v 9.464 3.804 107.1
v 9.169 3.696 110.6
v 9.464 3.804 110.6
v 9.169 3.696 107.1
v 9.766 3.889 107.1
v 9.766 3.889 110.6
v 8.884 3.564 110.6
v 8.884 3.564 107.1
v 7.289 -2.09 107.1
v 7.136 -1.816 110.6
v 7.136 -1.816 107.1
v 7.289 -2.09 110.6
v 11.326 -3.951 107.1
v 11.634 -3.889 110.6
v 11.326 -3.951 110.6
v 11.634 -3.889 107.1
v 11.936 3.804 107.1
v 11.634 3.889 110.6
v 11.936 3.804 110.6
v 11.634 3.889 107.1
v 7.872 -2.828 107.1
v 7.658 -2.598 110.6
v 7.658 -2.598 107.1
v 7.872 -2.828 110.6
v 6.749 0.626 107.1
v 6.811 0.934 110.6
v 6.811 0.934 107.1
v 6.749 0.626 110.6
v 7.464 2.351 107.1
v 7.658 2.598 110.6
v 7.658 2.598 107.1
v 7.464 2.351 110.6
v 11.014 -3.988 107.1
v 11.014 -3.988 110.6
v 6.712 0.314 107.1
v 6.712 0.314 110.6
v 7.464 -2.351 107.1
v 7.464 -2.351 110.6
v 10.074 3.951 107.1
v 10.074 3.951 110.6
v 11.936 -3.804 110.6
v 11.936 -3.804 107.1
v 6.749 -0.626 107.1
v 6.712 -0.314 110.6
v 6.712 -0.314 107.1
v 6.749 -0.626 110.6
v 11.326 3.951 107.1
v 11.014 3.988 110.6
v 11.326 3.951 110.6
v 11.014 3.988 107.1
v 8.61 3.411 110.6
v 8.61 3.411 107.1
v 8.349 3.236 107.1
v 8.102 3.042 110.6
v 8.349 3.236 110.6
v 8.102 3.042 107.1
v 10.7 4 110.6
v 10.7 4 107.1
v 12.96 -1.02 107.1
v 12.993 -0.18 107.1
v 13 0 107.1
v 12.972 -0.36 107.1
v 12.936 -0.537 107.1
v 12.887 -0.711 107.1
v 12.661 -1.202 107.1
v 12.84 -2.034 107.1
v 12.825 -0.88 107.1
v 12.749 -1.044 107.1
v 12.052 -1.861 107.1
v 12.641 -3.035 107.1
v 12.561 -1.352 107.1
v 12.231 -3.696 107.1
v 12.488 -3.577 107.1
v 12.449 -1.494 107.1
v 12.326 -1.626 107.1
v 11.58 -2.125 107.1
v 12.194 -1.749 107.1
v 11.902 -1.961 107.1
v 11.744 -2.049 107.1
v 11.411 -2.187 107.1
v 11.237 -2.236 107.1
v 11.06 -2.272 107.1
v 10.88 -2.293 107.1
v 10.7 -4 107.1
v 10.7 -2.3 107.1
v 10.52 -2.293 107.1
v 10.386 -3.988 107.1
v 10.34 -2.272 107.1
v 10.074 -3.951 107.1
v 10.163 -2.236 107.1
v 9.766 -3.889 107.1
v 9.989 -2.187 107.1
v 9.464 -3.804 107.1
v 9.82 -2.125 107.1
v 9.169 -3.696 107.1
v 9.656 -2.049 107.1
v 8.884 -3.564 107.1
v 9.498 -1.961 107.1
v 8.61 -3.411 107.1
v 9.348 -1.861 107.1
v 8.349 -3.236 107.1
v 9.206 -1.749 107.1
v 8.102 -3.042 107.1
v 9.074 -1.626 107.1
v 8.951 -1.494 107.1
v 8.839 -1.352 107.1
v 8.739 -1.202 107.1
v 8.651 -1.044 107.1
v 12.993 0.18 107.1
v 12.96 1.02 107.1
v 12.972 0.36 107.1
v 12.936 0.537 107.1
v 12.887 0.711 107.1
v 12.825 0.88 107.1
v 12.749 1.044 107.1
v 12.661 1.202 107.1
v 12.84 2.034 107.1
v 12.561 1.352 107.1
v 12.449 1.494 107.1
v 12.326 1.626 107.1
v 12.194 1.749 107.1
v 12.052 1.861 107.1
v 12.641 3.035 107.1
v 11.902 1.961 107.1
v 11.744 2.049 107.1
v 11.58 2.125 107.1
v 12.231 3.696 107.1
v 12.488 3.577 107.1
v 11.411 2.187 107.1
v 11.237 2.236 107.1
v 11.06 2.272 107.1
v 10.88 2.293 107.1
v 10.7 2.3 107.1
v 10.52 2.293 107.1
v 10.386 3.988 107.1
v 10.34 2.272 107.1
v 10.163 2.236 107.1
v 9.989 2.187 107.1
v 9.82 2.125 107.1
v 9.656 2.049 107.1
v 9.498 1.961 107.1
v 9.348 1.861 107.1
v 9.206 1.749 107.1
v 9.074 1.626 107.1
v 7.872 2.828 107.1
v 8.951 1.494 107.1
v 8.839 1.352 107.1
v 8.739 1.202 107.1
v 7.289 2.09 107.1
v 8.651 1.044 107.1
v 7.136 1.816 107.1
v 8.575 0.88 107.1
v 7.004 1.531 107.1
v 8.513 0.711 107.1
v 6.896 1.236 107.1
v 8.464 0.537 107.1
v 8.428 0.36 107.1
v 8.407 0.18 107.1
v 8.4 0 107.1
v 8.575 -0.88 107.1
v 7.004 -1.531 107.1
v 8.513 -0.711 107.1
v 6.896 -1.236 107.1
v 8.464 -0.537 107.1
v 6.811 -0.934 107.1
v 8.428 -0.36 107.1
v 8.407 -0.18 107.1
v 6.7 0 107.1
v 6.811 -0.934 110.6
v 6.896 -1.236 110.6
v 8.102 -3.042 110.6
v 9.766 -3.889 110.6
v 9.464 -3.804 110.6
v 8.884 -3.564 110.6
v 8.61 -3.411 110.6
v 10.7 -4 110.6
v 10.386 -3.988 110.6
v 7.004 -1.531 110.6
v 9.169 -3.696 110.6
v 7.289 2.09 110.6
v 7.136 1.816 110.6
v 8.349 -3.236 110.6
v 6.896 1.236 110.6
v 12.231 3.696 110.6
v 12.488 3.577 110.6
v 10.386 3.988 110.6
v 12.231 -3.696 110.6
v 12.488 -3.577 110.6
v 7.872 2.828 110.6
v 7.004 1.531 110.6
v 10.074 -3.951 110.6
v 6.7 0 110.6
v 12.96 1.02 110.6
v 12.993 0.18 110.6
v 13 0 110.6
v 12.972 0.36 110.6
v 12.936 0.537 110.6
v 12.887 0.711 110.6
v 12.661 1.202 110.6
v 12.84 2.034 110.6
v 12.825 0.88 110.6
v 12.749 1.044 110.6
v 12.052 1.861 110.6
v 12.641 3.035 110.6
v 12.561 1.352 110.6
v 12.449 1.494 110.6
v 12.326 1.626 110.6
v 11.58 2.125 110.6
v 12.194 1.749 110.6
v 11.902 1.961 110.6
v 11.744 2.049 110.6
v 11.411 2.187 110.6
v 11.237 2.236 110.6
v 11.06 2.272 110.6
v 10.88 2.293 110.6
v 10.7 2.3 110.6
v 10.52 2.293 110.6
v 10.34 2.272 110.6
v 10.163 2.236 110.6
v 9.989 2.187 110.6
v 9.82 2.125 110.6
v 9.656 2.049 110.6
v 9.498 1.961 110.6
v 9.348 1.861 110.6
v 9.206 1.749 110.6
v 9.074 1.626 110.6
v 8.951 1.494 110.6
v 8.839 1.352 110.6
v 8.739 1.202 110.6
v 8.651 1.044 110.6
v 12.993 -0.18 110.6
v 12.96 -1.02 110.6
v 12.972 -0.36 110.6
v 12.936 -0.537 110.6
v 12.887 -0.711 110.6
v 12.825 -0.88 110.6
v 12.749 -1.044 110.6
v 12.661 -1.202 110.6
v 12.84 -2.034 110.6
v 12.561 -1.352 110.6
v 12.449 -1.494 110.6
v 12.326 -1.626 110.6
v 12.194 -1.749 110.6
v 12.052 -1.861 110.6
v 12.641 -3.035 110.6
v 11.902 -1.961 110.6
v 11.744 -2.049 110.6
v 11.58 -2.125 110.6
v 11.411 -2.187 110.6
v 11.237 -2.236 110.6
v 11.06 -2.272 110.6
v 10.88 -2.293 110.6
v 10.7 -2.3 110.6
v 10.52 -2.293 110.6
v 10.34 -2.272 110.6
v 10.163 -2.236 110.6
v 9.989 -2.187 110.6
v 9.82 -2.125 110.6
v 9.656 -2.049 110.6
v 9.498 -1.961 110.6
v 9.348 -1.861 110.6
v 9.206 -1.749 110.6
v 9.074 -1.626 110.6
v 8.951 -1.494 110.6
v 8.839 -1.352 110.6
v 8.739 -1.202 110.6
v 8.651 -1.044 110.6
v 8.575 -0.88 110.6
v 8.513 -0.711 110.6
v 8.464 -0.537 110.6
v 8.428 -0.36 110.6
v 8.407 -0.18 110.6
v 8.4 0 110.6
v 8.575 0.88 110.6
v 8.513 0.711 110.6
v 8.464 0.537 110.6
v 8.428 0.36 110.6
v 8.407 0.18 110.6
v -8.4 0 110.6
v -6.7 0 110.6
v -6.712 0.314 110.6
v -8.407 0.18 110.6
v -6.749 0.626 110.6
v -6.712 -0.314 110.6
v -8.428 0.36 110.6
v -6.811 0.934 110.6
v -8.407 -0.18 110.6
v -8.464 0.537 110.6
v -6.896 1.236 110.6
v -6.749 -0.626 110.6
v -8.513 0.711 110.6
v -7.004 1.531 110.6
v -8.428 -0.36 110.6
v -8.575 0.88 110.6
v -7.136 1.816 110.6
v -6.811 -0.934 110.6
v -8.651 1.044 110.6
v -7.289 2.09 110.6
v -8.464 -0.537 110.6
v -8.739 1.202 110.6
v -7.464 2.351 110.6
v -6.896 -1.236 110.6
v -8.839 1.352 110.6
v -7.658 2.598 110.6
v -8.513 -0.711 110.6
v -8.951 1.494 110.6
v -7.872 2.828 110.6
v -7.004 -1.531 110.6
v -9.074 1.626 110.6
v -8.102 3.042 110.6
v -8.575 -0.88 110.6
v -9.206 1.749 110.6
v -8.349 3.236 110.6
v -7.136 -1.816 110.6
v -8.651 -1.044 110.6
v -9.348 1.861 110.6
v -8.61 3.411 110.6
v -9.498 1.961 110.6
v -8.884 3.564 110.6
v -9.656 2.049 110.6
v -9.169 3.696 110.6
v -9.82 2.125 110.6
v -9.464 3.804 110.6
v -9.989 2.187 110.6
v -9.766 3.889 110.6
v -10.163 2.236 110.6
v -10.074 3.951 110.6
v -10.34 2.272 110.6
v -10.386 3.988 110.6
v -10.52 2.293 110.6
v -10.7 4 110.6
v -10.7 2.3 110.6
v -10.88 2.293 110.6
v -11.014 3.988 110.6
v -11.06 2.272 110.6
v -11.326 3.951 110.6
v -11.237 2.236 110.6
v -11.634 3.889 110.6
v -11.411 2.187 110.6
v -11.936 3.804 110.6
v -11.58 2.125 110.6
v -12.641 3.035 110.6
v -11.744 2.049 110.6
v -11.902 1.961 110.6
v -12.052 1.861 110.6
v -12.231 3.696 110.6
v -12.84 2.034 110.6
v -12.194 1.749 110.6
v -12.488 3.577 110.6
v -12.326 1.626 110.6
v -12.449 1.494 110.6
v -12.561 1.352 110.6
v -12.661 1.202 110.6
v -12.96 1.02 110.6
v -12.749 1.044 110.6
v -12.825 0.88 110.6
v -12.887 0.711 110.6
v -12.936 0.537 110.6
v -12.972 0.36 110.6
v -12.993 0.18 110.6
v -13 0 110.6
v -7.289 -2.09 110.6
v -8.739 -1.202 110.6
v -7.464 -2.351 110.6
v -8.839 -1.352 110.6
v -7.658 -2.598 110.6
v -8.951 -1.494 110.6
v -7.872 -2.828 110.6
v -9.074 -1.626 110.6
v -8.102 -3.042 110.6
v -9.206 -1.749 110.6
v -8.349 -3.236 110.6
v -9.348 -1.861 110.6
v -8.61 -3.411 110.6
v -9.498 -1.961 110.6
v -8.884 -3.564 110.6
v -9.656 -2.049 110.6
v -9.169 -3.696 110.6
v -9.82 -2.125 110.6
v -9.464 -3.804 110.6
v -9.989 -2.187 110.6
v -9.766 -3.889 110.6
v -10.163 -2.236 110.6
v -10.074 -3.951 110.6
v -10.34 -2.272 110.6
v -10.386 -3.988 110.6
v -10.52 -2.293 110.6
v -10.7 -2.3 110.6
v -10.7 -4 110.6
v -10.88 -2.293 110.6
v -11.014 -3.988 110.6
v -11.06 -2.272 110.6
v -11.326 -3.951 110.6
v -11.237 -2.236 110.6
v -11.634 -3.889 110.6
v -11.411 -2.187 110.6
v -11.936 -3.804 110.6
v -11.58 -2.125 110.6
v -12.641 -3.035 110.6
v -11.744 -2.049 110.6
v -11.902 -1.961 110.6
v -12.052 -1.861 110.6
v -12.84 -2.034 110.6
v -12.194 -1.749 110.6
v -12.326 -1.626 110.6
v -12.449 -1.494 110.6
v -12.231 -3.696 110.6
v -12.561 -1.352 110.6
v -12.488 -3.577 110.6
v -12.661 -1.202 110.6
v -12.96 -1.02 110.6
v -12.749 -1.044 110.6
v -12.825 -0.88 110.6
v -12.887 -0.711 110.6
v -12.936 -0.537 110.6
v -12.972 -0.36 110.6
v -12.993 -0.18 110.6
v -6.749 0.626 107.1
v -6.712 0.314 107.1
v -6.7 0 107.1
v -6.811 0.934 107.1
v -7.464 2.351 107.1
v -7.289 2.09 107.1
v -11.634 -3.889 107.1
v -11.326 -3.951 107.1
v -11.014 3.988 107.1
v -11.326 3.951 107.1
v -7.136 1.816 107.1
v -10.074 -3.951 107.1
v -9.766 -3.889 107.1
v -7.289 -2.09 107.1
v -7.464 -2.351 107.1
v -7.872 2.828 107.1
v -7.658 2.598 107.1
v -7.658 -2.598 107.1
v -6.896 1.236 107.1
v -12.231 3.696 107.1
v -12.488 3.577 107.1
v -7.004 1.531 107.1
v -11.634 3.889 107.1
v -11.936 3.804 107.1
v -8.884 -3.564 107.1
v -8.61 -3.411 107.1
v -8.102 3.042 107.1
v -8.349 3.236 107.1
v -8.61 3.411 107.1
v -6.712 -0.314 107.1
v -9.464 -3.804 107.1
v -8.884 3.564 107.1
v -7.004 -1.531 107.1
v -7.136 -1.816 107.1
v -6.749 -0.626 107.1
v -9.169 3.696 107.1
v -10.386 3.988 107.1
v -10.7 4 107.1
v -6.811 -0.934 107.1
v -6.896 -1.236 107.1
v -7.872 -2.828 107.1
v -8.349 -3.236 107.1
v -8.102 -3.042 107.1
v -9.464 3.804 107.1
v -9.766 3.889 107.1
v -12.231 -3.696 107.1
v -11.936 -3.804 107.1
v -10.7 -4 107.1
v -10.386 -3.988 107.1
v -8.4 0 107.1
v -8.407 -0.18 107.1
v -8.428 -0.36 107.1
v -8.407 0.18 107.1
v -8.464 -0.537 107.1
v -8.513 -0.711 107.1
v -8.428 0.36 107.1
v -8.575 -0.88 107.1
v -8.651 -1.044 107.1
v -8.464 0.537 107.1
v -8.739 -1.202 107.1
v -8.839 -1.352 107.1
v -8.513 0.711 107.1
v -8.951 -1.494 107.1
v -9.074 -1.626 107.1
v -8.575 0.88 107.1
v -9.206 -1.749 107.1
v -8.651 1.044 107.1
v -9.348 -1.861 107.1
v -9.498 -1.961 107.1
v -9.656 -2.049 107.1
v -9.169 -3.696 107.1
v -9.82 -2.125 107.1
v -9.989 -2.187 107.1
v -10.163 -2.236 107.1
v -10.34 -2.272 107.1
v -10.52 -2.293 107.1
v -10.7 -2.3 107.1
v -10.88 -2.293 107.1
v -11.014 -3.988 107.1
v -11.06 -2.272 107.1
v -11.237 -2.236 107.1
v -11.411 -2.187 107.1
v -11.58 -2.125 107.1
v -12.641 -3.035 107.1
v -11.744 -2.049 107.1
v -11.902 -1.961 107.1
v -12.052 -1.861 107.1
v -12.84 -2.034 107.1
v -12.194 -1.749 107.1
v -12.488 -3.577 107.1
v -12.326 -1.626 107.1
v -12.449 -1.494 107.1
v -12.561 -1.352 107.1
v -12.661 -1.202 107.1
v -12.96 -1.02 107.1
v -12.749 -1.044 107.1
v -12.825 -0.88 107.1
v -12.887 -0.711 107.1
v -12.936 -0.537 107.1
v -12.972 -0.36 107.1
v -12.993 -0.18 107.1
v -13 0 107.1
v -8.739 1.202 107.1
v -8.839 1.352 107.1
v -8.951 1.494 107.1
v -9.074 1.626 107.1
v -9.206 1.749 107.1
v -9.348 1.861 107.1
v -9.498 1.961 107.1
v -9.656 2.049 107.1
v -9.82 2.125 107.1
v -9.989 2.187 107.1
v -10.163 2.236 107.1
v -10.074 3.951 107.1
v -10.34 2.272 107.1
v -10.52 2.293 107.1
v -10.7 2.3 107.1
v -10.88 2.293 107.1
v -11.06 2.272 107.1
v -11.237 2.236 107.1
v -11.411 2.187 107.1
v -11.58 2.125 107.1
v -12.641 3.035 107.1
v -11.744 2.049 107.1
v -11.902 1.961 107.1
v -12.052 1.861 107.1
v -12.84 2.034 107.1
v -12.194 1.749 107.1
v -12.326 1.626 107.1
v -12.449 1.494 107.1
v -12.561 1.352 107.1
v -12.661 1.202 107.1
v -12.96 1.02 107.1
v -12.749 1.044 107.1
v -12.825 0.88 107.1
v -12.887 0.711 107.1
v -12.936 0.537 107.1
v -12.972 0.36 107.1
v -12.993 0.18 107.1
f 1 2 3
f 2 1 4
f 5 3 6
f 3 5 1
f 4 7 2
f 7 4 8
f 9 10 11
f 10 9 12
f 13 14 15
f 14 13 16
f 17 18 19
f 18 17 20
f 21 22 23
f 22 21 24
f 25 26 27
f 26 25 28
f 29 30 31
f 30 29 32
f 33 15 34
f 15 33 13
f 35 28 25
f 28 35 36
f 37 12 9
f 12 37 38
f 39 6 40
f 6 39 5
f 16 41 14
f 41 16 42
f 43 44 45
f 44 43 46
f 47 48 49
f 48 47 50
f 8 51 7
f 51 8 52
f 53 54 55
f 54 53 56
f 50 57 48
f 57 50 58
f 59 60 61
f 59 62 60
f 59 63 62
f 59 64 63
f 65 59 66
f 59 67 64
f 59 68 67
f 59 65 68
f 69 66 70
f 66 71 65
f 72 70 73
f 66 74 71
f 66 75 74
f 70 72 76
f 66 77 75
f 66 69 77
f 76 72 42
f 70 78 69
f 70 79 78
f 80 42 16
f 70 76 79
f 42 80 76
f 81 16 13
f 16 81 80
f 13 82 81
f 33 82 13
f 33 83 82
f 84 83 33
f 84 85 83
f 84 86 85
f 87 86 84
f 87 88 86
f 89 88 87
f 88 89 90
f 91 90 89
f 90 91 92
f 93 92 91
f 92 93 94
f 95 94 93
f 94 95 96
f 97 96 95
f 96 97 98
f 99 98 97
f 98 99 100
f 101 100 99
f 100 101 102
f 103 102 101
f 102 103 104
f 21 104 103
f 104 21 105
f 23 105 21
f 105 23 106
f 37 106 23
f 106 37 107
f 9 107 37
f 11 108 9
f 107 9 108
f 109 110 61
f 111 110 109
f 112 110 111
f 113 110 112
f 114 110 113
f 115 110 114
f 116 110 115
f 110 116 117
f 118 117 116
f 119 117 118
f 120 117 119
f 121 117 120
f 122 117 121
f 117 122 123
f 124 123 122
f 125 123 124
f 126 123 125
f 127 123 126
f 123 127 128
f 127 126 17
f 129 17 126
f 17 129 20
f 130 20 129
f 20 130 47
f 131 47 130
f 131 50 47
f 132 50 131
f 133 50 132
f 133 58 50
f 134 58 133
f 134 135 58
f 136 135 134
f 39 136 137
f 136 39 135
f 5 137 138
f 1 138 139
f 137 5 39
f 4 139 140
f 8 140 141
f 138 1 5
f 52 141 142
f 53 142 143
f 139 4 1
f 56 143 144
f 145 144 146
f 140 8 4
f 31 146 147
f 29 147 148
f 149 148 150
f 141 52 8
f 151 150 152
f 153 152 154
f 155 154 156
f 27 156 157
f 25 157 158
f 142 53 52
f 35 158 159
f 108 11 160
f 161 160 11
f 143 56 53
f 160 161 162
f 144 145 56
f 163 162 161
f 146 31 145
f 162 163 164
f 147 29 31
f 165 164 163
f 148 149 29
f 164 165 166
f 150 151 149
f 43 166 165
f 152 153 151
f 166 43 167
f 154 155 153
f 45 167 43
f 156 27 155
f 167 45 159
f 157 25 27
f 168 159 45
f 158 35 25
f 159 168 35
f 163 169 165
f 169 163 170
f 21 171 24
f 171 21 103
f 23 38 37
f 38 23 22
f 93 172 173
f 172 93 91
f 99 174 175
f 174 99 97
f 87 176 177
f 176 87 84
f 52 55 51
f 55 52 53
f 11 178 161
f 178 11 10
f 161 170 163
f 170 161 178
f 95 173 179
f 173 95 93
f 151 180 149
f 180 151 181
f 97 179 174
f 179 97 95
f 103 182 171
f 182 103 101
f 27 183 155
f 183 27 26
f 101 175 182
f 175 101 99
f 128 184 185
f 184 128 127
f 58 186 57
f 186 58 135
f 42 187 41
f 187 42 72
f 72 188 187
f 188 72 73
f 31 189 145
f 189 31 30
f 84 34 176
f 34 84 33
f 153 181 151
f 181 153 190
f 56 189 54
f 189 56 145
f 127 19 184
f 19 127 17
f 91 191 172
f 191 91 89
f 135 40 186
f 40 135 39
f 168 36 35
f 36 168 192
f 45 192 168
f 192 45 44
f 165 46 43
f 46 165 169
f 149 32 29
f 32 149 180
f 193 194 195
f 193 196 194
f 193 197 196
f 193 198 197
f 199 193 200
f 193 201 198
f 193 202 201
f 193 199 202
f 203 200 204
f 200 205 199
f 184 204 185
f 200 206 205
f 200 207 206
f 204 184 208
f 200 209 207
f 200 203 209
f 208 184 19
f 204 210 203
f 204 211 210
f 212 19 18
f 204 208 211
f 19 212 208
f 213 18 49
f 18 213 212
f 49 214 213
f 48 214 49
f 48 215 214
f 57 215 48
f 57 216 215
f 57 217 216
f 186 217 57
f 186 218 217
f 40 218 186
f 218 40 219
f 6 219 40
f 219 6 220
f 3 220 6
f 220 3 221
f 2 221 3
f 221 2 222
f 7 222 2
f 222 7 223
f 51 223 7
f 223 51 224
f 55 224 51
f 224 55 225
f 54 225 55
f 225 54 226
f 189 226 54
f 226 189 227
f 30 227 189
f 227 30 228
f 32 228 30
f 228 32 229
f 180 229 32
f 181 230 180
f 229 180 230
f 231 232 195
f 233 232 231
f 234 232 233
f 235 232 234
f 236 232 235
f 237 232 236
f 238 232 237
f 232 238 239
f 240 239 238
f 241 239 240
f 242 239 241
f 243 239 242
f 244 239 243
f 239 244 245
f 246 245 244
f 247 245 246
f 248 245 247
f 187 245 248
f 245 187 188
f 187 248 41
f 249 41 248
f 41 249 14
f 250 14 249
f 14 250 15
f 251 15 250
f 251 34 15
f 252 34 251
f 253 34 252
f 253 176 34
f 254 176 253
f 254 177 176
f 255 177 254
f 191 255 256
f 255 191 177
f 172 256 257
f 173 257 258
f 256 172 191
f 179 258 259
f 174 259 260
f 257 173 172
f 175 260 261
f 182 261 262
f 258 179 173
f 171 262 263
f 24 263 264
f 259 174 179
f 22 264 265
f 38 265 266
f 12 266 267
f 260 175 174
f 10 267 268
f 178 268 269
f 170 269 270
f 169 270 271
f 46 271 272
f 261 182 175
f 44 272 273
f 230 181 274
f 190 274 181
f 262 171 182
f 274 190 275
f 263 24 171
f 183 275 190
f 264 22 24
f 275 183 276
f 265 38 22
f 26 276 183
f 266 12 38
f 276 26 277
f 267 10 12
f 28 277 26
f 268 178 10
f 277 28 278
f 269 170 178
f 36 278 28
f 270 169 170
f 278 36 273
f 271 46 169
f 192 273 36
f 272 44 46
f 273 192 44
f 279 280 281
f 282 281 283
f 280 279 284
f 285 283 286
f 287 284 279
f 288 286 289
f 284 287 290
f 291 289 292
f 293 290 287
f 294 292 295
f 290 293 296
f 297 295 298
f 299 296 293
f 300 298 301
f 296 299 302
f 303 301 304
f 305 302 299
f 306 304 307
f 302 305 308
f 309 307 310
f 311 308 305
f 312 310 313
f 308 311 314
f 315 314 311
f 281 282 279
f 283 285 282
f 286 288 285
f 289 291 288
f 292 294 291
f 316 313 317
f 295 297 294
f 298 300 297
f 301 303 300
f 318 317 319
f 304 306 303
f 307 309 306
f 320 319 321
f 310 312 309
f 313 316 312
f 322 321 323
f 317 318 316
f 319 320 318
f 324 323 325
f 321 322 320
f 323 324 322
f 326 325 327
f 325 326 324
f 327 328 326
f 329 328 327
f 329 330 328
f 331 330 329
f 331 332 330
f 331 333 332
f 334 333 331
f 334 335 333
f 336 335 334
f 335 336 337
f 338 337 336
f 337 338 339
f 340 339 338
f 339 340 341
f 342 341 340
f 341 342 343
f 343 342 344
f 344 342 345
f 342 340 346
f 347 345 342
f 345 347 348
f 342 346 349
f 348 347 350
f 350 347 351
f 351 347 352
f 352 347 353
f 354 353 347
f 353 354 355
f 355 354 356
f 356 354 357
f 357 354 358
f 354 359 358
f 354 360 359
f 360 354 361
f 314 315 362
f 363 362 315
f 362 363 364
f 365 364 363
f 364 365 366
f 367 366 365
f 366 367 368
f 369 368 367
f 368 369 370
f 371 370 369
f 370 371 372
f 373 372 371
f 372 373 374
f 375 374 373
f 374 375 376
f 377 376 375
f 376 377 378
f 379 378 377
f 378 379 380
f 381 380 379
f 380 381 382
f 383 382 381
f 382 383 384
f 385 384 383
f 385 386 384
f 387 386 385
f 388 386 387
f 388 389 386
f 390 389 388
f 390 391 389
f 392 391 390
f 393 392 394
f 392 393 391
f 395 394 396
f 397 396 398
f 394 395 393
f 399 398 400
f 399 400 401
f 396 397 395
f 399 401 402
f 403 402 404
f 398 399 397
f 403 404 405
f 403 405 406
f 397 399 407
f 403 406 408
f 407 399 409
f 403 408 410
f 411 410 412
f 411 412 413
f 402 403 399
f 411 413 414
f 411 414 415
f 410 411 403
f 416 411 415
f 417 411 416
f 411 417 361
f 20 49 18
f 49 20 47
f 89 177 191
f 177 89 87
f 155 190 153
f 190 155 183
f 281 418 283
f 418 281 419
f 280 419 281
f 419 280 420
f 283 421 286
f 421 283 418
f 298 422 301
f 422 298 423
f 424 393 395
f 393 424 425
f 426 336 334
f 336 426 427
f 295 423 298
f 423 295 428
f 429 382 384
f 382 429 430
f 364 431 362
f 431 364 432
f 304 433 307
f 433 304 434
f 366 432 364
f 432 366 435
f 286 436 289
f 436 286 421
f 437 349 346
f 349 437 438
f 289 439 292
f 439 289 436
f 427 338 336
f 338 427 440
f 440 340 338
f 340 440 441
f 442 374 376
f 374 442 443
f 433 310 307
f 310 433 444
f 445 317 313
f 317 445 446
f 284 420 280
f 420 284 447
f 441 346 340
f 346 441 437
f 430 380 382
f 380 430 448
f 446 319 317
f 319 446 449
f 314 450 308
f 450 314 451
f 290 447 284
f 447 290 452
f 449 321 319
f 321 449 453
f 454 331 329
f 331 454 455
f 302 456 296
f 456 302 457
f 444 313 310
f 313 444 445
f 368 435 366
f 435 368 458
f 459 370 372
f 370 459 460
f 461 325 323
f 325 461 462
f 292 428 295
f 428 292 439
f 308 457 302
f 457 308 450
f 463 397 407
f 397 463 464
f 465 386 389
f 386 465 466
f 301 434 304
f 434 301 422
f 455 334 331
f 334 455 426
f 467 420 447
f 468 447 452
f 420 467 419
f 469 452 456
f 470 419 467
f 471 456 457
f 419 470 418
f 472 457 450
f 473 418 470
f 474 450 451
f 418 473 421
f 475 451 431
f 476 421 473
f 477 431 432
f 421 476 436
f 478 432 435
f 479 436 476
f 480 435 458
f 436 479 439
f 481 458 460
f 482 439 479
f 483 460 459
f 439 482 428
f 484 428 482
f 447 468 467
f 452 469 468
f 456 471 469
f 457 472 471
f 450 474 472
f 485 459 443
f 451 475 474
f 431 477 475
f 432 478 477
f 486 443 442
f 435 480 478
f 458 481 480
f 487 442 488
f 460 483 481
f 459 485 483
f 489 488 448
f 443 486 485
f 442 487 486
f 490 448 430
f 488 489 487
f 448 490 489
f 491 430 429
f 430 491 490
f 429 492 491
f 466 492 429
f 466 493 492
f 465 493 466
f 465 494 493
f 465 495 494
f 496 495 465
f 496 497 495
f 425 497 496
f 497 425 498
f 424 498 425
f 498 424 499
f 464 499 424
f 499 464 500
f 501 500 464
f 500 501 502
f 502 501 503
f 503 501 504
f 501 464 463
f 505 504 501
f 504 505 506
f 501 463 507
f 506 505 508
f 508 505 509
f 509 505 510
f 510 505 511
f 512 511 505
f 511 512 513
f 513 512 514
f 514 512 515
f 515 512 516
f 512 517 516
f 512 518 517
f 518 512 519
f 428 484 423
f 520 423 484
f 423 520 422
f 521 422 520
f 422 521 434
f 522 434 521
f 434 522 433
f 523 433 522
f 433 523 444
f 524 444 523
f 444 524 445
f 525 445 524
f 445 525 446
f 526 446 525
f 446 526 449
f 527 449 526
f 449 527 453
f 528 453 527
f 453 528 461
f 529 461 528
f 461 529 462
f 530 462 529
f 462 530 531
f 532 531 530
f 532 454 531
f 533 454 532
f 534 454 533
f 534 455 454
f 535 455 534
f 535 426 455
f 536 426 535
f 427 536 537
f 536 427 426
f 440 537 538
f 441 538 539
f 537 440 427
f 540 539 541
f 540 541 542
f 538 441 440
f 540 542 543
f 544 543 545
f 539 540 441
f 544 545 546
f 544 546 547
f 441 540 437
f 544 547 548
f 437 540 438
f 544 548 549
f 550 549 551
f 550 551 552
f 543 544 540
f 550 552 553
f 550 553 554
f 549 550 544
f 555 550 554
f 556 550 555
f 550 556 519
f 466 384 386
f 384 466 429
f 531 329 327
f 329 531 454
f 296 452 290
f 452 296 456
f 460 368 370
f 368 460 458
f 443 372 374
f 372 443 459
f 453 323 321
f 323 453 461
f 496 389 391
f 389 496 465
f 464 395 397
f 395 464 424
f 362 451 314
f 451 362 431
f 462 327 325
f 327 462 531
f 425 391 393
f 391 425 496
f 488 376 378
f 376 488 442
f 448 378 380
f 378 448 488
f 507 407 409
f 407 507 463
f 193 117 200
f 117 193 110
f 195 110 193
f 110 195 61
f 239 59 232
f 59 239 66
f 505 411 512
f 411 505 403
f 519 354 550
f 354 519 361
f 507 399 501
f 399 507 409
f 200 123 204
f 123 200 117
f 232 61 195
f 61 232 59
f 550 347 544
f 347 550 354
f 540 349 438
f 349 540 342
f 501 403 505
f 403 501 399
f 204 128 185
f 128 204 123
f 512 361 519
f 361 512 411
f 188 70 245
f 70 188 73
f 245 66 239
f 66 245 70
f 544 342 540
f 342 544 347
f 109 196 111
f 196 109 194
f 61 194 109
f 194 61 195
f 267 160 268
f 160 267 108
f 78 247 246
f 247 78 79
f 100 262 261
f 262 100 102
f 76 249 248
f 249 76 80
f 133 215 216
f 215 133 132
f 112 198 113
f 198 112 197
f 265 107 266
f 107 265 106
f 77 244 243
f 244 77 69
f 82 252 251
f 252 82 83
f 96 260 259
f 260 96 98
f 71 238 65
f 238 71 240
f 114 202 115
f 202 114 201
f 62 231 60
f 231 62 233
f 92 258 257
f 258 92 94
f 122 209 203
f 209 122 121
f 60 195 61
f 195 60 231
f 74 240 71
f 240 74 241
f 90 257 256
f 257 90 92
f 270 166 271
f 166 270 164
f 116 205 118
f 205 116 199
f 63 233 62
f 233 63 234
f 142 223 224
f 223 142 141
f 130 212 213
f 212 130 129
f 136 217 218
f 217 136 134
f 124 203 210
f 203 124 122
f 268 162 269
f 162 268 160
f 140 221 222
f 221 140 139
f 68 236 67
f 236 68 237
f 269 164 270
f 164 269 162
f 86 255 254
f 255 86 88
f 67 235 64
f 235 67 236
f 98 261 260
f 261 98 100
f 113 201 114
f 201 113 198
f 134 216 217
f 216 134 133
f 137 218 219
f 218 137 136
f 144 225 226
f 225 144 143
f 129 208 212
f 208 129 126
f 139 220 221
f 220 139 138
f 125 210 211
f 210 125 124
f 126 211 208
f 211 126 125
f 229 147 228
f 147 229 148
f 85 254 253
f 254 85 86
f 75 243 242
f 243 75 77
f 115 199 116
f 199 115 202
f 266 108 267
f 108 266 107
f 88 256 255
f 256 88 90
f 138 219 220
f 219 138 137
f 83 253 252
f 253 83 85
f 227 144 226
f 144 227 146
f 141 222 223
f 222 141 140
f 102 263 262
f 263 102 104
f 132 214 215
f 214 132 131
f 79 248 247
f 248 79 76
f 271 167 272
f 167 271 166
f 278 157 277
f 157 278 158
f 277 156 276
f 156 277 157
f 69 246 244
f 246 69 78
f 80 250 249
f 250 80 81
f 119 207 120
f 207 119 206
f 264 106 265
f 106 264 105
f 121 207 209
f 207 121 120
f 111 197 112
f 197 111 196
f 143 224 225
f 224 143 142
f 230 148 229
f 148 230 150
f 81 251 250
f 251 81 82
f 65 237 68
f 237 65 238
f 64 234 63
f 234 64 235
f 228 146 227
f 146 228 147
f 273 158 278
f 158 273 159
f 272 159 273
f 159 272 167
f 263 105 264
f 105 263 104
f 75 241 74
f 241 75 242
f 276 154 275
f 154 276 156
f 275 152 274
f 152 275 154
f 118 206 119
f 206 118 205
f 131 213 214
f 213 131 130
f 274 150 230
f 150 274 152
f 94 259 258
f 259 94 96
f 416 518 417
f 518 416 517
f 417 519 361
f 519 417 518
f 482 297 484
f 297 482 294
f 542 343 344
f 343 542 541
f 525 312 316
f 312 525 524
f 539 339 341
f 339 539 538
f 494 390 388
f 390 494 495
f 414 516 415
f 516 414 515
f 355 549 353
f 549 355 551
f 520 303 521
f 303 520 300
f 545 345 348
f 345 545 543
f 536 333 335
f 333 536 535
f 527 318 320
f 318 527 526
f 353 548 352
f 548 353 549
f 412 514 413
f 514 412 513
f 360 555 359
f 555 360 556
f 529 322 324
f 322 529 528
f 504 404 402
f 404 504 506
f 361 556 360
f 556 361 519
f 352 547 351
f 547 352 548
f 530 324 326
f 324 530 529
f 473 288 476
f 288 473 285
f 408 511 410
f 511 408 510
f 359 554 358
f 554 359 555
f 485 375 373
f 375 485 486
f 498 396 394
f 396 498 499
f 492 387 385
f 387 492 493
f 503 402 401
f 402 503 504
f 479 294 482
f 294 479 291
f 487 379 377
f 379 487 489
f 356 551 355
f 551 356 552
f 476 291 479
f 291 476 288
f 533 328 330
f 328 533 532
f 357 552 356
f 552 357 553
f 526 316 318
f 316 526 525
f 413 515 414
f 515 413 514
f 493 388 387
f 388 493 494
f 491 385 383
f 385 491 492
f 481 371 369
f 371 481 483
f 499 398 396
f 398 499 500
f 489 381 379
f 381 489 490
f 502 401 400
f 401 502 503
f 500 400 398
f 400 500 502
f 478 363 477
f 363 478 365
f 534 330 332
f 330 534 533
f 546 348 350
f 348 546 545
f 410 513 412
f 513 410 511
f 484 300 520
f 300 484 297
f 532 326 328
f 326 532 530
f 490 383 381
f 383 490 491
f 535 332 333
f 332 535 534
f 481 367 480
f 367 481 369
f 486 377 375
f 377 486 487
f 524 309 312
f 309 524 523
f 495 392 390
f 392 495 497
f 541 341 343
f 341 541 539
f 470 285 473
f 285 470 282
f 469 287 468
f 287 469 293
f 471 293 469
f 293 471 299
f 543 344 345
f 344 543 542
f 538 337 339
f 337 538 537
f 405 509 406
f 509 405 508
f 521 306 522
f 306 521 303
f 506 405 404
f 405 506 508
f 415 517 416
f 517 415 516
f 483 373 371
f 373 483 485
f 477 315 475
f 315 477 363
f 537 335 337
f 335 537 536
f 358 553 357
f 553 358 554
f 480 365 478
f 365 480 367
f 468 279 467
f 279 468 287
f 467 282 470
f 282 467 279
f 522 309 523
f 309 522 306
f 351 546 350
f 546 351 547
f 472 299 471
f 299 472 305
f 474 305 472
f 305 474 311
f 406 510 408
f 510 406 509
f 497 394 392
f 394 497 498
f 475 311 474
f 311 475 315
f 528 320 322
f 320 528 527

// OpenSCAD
// file: ../baffles.scad
use <shapes.scad>

D_OUTER = 2;
D_THIN  = 3;
D_INNER = 6;

module curveBridge(h, y, z, low, high)
{
    EPS = 0.1;

    // a + b*t + c*t*t + d*t*t*t
    al = low[0];
    bl = low[1];
    cl = low[2];
    dl = low[3];
    ah = high[0];
    bh = high[1];
    ch = high[2];
    dh = high[3];

    t = z;
    points = [
        [-EPS, al],
        [0.1, al + 0.1*bl + 0.1*0.1*cl + 0.1*0.1*0.1*dl],
        [0.2, al + 0.2*bl + 0.2*0.2*cl + 0.2*0.2*0.2*dl],
        [0.3, al + 0.3*bl + 0.3*0.3*cl + 0.3*0.3*0.3*dl],
        [0.4, al + 0.4*bl + 0.4*0.4*cl + 0.4*0.4*0.4*dl],
        [0.5, al + 0.5*bl + 0.5*0.5*cl + 0.5*0.5*0.5*dl],
        [0.6, al + 0.6*bl + 0.6*0.6*cl + 0.6*0.6*0.6*dl],
        [0.7, al + 0.7*bl + 0.7*0.7*cl + 0.7*0.7*0.7*dl],
        [0.8, al + 0.8*bl + 0.8*0.8*cl + 0.8*0.8*0.8*dl],
        [0.9, al + 0.9*bl + 0.9*0.9*cl + 0.9*0.9*0.9*dl],
        [1.0+EPS, al + 1.0*bl + 1.0*1.0*cl + 1.0*1.0*1.0*dl],
        [1.0+EPS, ah + 1.0*bh + 1.0*1.0*ch + 1.0*1.0*1.0*dh],
        [0.9, ah + 0.9*bh + 0.9*0.9*ch + 0.9*0.9*0.9*dh],
        [0.8, ah + 0.8*bh + 0.8*0.8*ch + 0.8*0.8*0.8*dh],
        [0.7, ah + 0.7*bh + 0.7*0.7*ch + 0.7*0.7*0.7*dh],
        [0.6, ah + 0.6*bh + 0.6*0.6*ch + 0.6*0.6*0.6*dh],
        [0.5, ah + 0.5*bh + 0.5*0.5*ch + 0.5*0.5*0.5*dh],
        [0.4, ah + 0.4*bh + 0.4*0.4*ch + 0.4*0.4*0.4*dh],
        [0.3, ah + 0.3*bh + 0.3*0.3*ch + 0.3*0.3*0.3*dh],
        [0.2, ah + 0.2*bh + 0.2*0.2*ch + 0.2*0.2*0.2*dh],
        [0.1, ah + 0.1*bh + 0.1*0.1*ch + 0.1*0.1*0.1*dh],
        [-EPS, ah]
    ];

    multmatrix(m = [ [0, 0, 1, 0],
                     [0, y, 0, 0],
                     [z, 0, 0, 0],
                     [0, 0, 0, 1]
                ])
    linear_extrude(height = h) {
        polygon(points=points);
    }  	
}

module bridge2(d, dz)
{
    SPACE_I = 6.0;
    SPACE_O = 1.0;

    difference() {
        intersection() 
        {
            tube(h=dz, do=d - SPACE_O, di=d - SPACE_I);
            union() {
                translate([-d, d*0.15, 0]) {
                    polygonYZ(d*2, [
                        [0,0], [dz*2, dz*2], [dz*3.5, dz*1.5], [dz*2.5, 0]
                    ]);
                }        
                translate([-d, -d*0.32, 0]) {
                    polygonYZ(d*2, [[0,0], [dz*2, dz*2], [dz*3, 0]]);
                }        
            }
        }
        BATTERY = 19.0; // padded
        translate([0, d/2 - BATTERY/2, 0])
            cylinder(h=d, d=BATTERY);
    }
}

module bridge4UpperWall(d, dz)
{
    intersection() 
    {
        cylinder(h=dz, d=d - 1.0);
        union() {
            translate([-d/2 - 1.0, d*0.08, 0]) {
                rotate([0, 0, -35]) {
                    polygonYZ(2.0, [
                        [0,0], 
                        [dz*3.0, dz*2], 
                        [dz*3.0, dz*1.5], 
                        [dz*3.0, 0]
                    ]);
                }
            }        
        }
    }
}

module bridge4(d, dz)
{
    intersection() 
    {
        tube(h=dz, do=d - D_OUTER, di=d - D_INNER);
        translate([-d, -d*0.32, 0]) {
            polygonYZ(d*2, [[0,0], [dz*2, dz*2], [dz*2, 0]]);
        }        
    }
    bridge4UpperWall(d, dz);
    mirror([-1, 0, 0]) bridge4UpperWall(d, dz);
}

module bridge5(d, dz)
{
    EPS = 0.1;
    D_BATTERY = 18.50 + 0.5;    // An 1850. Huh. 
    difference() {
        intersection() 
        {
            tube(h=dz, do=d - 2.0, di=d - 8.0);
            union() {
                translate([-d, -d*0.35, -EPS]) {
                    polygonYZ(d*2, [[0,0], [dz*2, dz*2], [dz*2, 0]]);
                }        
                translate([-d, 0, 0]) {
                    polygonYZ(d*2, [
                        [0,0], [dz, dz+EPS*2], 
                        [d*0.4, dz+EPS*2], [d*0.25, 0]
                    ]);
                }        
            }
        }
        translate([0, d/2 - D_BATTERY/2, 0])
            cylinder(d=D_BATTERY + 1.0, h = dz+EPS);
    }
}

module bridge3(d, dz)
{
    difference() {
        union() {
            intersection() 
            {
                tube(h=dz, do=d - D_OUTER, di=d - D_INNER);
                union() {
                    translate([-d, 0, 0]) {
                        curveBridge(d*2, dz, dz, 
                            [-2.5, 1.0, 1.0, 0.0], 
                            [-1.5, 0.5, 2.0, 0.0]);
                    }
                    translate([-d, 0, 0]) {
                        curveBridge(d*2, dz, dz, 
                            [ 0.0, 1.0, 1.0, 0.0], 
                            [ 1.5, 0.0, 1.5, 0.0]);
                    }
                }
            }
            color("silver") 
            intersection() 
            {
                tube(h=dz, do=d - D_THIN, di=d - D_INNER);
                translate([-d, 0, 0]) {
                    curveBridge(d*2, dz, dz, 
                        [ 2.5, -1.0, -1.5, 0.0], 
                        [ 3.0, -1.0, 0.5, 0.0]);
                }
            }
            color("silver")
            intersection() 
            {
                tube(h=dz, do=d - D_THIN, di=d - D_INNER);
                translate([-d, 0, 0]) {
                    curveBridge(d*2, dz, dz, 
                        [ -0.8, -1.0, -0.5, -0.2], 
                        [ -0.2, -1.0, -0.1, 0.0]);
                }
            }
        }
        BATTERY = 19.0; // padded
        translate([0, d/2 - BATTERY/2, 0])
            cylinder(h=d, d=BATTERY);
        X = 19.0; // padded
        translate([-X/2, -d/2, 0])
            cube(size=[X, d/2, dz]);
    }
}

translate([0, 0, 0]) tube(h=4, do=32, di=26);
translate([0, 0, 8]) tube(h=4, do=32, di=26);
translate([0, 0, 16]) tube(h=4, do=32, di=26);
translate([0, 0, 24]) tube(h=4, do=32, di=26);
translate([0, 0, 32]) tube(h=4, do=32, di=26);

translate([0, 0, 4]) bridge3(32, 4);
translate([0, 0, 12]) bridge3(32, 4);
translate([0, 0, 20]) bridge3(32, 4);
translate([0, 0, 28]) bridge3(32, 4);


/*
translate([0, 0, 0]) cube(size=[1, 30, 4]);
translate([0, 0, 8]) cube(size=[1, 30, 4]);
translate([-1, 4, 4]) 
    curveBridge(0.8, 4, 4, [0, 1.0, 0.3, 0.1], 
                           [1, 1.0, 0.3, 0.1]);
translate([-1, 16, 4]) 
    curveBridge(0.8, 4, 4, [0, 1.0, 0.3, 0.1], 
                           [1, 1.0, 0.3, 0.1]);                           

translate([0, 16, 4]) 
    curveBridge(0.8, 4, 4, [0, -1.0, 0.3, 0.1], 
                           [0.6, -1.0, 0.3, 0.1]);
*/
// file: ../shapes.scad
FACES   = 180;
EPSILON = 0.1;
PIN	    = 2.54;


module tube(_h, _rInner, _rOuter) {
	difference() {
		cylinder(h=_h, r=_rOuter, $fn=FACES);
		translate([0,0,-EPSILON]) {
			cylinder(h=_h + EPSILON*2, r=_rInner, $fn=FACES);
		}
	}
}

module shelf(_r0, _h, _r1) {
	rotate_extrude($fn=FACES) {
		polygon([[_r0, 0], [_r1, _h], [_r0, _h]]);
	}
}


module pinsAtTube(r, h, nX, nY, longY)
{
	OFFSET = sqrt(r * r - PIN * PIN * nX * nX / 4);

	Y = longY ? 40 : PIN * nY;

    translate([-nX * PIN / 2, OFFSET - PIN * nY, 0]) {
        cube([nX * PIN, Y, h]);
    }	
}
// file: dimCoupler.scad
TOOTH_CAP = 1.0;
TOOTH_BASE = 8.6;   // height w/o teeth caps
TOOTH_HEIGHT = TOOTH_BASE + TOOTH_CAP;
H_COUPLER_PCB = 1.5;
R_COUPLER_MOUNT = 2.54 * 3.0 + 0.5;
D_COUPLER_INNER = (2.54 * 3.0 - 1.5) * 2;
D_COUPLER_OUTER = 20.24; //(2.54 * 3.0 + 1.5) * 2 + 2.0;
D_M2_HEAD = 4.0;
D_M2 = 1.8;
D_COUPLER_DISC = 22.0;
// file: dim.scad
use <../commonUnified.scad>
M_0 = 0;

// Test trims - rather tight.
M_START = -((42.0 - 10.0) - 1.0);
DZ_SPKR = 12.0;
M_MC_BATTERY = M_START + DZ_SPKR;

DZ_BODY = 101.6;
M_AFT_FRONT = DZ_BODY - 10.5 - 0.5;
M_TRANSITION_RING = DZ_BODY - 15.0;
M_COUPLER_START = M_AFT_FRONT + 1.0;

DZ_AFT = M_AFT_FRONT - M_START;

D_VENT = 26.0;
D_VENT_BOLT = 13.5;     // guess...
D_VENT_INNER = 20.60;    // coupler is 20.24

D_INNER = 31.60;    // 31.7 is fine for the body, but too tight for the pommel
D_OUTER = 36.9;

DZ_BAFFLE = 3.0;

N_BATT_BAFFLES = nBafflesNeeded(DZ_BAFFLE, "18650");
M_JOINT = M_MC_BATTERY + zLenOfBaffles(N_BATT_BAFFLES, DZ_BAFFLE);

DZ_POWER_RING = 18.0;
DZ_BOLT = 8.0;          // switch to allen head for space?
DZ_SWITCH = (M_AFT_FRONT - M_JOINT - DZ_POWER_RING - DZ_BOLT);

DZ_RING0 = 3.0; // thickness of the aft vent coupler
DZ_RING1 = 2.5; // fore vent coupler (non-standard)

DZ_FORE_FULL = M_AFT_FRONT - M_JOINT;
DZ_FORE_TRIM = DZ_FORE_FULL - DZ_RING0;

M_BOLT_START = M_JOINT + DZ_POWER_RING;
M_SWITCH_START = M_BOLT_START + DZ_BOLT;

M_BOLT = M_BOLT_START + DZ_BOLT / 2;
M_PORT = M_JOINT + DZ_POWER_RING / 2;
M_SWITCH = M_SWITCH_START + DZ_SWITCH / 2;

INSET_W = 14.0;
D_RING = 33.4;

DX_SWITCH_PLATE = 16.5;

D_TUBE = 4.6;
D_TUBE_INNER = 3.3;
D_ROD = 3.6;
D_BOLT_CAP = 7.0;
D_HOLDER = 8.0;
// main file
include <dim.scad>
include <dimCoupler.scad>
use <../shapes.scad>

$fn = 80;
EPS = 0.01;

DEPTH = 15.0;
AFT_DEPTH = 20.0;
M_TUBE = 10.0;
M_INNER = 3.0;
M_INSET = 11.0;

W_INSET = 13.5;
T_INSET = 1.0;

DZ_AFT_TUBE = 3.5;  // AFT_DEPTH - (2.0 * H_COUPLER_PCB + TOOTH_HEIGHT);
W_PCB_CUT = 16.0;

module holes()
{
    translate([(D_VENT - D_TUBE)/2, 0, 0])
        cylinder(h=100, d=D_TUBE_INNER);
    translate([(D_VENT - D_TUBE)/2, 0, M_TUBE])
        cylinder(h=100, d=D_TUBE);

}


module aftHoles()
{
    translate([(D_VENT - D_TUBE)/2, 0, 0])
        cylinder(h=100, d=D_TUBE_INNER);
    translate([(D_VENT - D_TUBE)/2, 0, AFT_DEPTH - DZ_AFT_TUBE])
        cylinder(h=100, d=D_TUBE);

}

module pcbHolder()
{
    /*
    intersection() {
        cylinder(h=200, d=D_VENT);
        color("plum") 
            translate([-W_PCB_CUT/2, -50, M_COUPLER_START + H_COUPLER_PCB + TOOTH_HEIGHT]) 
                cube(size=[W_PCB_CUT, 100, H_COUPLER_PCB]);
    }
    */

    hull() {
        translate([0, 0, M_COUPLER_START + H_COUPLER_PCB + TOOTH_HEIGHT]) {
            cylinder(h=H_COUPLER_PCB, d=D_COUPLER_DISC);
        }
        translate([0, 30, M_COUPLER_START + H_COUPLER_PCB + TOOTH_HEIGHT]) {
            cylinder(h=H_COUPLER_PCB, d=D_COUPLER_DISC);
        }
    }
}

module cap(dzRing, isAft)
{
    depth = isAft ? AFT_DEPTH : DEPTH;

    difference() {
        union() {
            tube(h=dzRing, do=D_RING, di=D_VENT_INNER);
            tube(h=depth, do=D_VENT, di=D_VENT_INNER);

            intersection() {
                cylinder(h=depth, d=D_VENT);
                union() {
                    if (isAft) {
                        translate([(D_VENT - D_TUBE)/2, 0, AFT_DEPTH - DZ_AFT_TUBE]) cylinder(h=DZ_AFT_TUBE, d=D_HOLDER);
                        translate([-(D_VENT - D_TUBE)/2, 0, AFT_DEPTH - DZ_AFT_TUBE]) cylinder(h=DZ_AFT_TUBE, d=D_HOLDER);
                    }
                    else {
                        translate([(D_VENT - D_TUBE)/2, 0, 0]) cylinder(h=100, d=D_HOLDER);
                        translate([-(D_VENT - D_TUBE)/2, 0, 0]) cylinder(h=100, d=D_HOLDER);
                    }
                }
            }

        }  
        if (isAft) {
            aftHoles();
            rotate([0, 0, 180]) aftHoles();
        }
        else {
            holes();
            rotate([0, 0, 180]) holes();
        }

        // Wire access
        cylinder(h=M_INNER, d=D_VENT_INNER);

        if (!isAft) {
            // Brass inset
            translate([-W_INSET/2, -50, M_INSET]) 
                cube(size=[W_INSET, 100, T_INSET]);
        }

        if (isAft) {
            // cutout to fit the switch plate
            translate([-50, D_HOLDER/2, 0]) cube(size=[100, 100, dzRing + EPS]);
        }
    }
}

// Aft cap
difference() {
    union() {
        translate([0, 0, M_AFT_FRONT]) cap(DZ_RING0, true);
    }
    pcbHolder();
    *translate([0, 0, M_COUPLER_START]) cylinder(d=D_COUPLER_OUTER, h=2.0 * H_COUPLER_PCB + TOOTH_HEIGHT - H_COUPLER_PCB);
}

// Fore cap
*union() {
    cap(DZ_RING1, false);
}
